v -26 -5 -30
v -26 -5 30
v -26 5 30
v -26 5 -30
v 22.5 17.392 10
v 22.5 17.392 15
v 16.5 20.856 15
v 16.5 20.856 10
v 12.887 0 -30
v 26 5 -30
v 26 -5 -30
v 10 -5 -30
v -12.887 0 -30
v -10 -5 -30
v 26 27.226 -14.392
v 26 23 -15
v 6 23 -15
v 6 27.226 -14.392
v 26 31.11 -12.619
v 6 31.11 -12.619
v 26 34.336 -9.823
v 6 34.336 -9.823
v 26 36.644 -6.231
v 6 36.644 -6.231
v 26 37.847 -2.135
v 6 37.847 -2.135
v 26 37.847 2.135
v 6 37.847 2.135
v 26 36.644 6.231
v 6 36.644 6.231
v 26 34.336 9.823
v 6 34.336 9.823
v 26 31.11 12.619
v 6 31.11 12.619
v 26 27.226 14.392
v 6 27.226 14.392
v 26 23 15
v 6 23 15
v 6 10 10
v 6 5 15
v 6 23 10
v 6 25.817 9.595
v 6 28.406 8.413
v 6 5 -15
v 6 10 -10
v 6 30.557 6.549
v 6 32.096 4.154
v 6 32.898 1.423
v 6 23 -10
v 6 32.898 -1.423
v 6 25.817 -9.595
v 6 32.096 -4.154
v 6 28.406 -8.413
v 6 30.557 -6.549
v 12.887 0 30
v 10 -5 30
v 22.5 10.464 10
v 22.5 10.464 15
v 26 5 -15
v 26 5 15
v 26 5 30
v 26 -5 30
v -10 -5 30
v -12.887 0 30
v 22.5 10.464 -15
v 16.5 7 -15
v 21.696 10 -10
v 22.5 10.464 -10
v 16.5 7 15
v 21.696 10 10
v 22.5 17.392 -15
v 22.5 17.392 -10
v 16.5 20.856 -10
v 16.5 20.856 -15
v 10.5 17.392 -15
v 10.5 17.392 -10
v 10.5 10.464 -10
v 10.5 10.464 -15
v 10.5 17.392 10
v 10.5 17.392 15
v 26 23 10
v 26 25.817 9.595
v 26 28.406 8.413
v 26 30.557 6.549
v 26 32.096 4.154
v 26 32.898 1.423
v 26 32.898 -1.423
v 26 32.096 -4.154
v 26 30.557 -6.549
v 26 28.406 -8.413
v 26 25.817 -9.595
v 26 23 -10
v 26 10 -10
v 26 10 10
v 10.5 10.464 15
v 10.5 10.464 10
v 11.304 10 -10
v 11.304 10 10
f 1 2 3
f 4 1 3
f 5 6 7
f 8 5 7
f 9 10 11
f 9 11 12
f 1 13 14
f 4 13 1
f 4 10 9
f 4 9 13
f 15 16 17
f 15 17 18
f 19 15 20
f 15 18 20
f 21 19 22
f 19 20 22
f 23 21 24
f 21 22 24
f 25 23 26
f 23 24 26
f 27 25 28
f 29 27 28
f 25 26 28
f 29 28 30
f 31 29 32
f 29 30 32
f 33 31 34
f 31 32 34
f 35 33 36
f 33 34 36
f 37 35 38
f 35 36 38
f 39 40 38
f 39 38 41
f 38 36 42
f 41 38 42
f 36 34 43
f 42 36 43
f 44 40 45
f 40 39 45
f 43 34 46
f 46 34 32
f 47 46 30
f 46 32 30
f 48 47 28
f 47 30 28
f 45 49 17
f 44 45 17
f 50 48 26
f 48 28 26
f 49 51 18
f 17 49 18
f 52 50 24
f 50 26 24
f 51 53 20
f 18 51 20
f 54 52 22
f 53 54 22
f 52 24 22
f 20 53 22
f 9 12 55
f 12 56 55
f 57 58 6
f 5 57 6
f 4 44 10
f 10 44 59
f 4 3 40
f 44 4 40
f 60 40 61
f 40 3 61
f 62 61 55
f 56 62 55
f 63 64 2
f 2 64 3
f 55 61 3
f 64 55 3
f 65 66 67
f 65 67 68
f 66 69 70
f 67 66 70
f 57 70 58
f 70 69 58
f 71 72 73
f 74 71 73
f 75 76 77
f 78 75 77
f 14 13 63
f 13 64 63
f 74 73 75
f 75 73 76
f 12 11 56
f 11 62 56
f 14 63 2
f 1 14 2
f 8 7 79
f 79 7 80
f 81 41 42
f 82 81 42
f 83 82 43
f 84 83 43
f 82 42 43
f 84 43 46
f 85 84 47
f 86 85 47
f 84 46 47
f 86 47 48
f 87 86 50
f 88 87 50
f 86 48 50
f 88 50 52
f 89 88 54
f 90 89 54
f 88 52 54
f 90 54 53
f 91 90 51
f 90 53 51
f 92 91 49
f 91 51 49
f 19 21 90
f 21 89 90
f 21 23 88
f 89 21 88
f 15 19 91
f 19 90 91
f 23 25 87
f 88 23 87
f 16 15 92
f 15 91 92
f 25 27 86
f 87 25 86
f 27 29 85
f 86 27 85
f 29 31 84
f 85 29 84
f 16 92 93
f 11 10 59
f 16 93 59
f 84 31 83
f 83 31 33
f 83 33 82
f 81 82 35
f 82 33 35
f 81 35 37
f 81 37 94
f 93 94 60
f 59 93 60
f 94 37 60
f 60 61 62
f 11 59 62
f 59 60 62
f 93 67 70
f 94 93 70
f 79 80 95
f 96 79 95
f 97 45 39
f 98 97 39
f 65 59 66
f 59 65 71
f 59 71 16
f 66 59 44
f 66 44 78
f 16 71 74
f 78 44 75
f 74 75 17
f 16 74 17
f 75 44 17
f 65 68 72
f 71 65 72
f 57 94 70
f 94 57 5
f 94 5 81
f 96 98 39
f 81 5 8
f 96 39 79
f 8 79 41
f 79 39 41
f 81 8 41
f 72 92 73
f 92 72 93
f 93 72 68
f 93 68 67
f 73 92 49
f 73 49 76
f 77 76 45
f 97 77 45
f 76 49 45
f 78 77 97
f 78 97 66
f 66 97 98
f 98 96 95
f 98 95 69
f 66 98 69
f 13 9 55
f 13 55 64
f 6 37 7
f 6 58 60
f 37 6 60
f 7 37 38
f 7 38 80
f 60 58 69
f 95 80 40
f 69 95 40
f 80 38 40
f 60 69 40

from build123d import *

# Parameters (mm, degrees)
EXTRUDE_2_DEPTH     = 30
EXTRUDE_START       = -20
EXTRUDE_1_DEPTH     = 20
CUT_EXTRUDE_1_REACH = 59.671


# Read off the part's stored shape, not the designer's step: 拉伸-薄壁1
with BuildPart() as part:
    # 草图1 → 凸台-拉伸2 (new, symmetric)
    with BuildSketch(Plane.XY):
        Polygon((-26, 5), (26, 5), (26, -5), (10, -5), (12.886751346, 0), (-12.886751346, 0), (-10, -5), (-26, -5), align=None)
    extrude(amount=EXTRUDE_2_DEPTH, both=True)

    # 拉伸-薄壁1 outline → 拉伸-薄壁1 (add)
    with BuildSketch(Plane(origin=(26, 0, 0), x_dir=(0, 0, -1), z_dir=(1, 0, 0)).offset(EXTRUDE_START)):
        with BuildLine():
            Line((15, 5), (15, 23))
            ThreePointArc((15, 23), (0, 38), (-15, 23))
            Line((-15, 23), (-15, 5))
            Line((-15, 5), (15, 5))
        make_face()
        with BuildLine():
            ThreePointArc((-10, 23), (0, 33), (10, 23))
            Line((10, 23), (10, 10))
            Line((10, 10), (-10, 10))
            Line((-10, 10), (-10, 23))
        make_face(mode=Mode.SUBTRACT)
    extrude(amount=EXTRUDE_1_DEPTH)

    # 草图6 → 切除-拉伸1 (cut, up to next)
    with BuildSketch(Plane(origin=(0, 20, 15), x_dir=(1, 0, 0), z_dir=(0, 0, 1)), mode=Mode.PRIVATE) as cut_extrude_1_sk1:
        Polygon((22.5, -2.607695155), (16.5, 0.856406461), (10.5, -2.607695155), (10.5, -9.535898385), (16.5, -13), (22.5, -9.535898385), align=None)
    cut_extrude_1_tool1 = extrude(cut_extrude_1_sk1.sketch, amount=-CUT_EXTRUDE_1_REACH, mode=Mode.PRIVATE) & part.part
    add(cut_extrude_1_tool1.solids().sort_by_distance((16.5, 13.928203, 15))[0], mode=Mode.SUBTRACT)


solid = part.part
